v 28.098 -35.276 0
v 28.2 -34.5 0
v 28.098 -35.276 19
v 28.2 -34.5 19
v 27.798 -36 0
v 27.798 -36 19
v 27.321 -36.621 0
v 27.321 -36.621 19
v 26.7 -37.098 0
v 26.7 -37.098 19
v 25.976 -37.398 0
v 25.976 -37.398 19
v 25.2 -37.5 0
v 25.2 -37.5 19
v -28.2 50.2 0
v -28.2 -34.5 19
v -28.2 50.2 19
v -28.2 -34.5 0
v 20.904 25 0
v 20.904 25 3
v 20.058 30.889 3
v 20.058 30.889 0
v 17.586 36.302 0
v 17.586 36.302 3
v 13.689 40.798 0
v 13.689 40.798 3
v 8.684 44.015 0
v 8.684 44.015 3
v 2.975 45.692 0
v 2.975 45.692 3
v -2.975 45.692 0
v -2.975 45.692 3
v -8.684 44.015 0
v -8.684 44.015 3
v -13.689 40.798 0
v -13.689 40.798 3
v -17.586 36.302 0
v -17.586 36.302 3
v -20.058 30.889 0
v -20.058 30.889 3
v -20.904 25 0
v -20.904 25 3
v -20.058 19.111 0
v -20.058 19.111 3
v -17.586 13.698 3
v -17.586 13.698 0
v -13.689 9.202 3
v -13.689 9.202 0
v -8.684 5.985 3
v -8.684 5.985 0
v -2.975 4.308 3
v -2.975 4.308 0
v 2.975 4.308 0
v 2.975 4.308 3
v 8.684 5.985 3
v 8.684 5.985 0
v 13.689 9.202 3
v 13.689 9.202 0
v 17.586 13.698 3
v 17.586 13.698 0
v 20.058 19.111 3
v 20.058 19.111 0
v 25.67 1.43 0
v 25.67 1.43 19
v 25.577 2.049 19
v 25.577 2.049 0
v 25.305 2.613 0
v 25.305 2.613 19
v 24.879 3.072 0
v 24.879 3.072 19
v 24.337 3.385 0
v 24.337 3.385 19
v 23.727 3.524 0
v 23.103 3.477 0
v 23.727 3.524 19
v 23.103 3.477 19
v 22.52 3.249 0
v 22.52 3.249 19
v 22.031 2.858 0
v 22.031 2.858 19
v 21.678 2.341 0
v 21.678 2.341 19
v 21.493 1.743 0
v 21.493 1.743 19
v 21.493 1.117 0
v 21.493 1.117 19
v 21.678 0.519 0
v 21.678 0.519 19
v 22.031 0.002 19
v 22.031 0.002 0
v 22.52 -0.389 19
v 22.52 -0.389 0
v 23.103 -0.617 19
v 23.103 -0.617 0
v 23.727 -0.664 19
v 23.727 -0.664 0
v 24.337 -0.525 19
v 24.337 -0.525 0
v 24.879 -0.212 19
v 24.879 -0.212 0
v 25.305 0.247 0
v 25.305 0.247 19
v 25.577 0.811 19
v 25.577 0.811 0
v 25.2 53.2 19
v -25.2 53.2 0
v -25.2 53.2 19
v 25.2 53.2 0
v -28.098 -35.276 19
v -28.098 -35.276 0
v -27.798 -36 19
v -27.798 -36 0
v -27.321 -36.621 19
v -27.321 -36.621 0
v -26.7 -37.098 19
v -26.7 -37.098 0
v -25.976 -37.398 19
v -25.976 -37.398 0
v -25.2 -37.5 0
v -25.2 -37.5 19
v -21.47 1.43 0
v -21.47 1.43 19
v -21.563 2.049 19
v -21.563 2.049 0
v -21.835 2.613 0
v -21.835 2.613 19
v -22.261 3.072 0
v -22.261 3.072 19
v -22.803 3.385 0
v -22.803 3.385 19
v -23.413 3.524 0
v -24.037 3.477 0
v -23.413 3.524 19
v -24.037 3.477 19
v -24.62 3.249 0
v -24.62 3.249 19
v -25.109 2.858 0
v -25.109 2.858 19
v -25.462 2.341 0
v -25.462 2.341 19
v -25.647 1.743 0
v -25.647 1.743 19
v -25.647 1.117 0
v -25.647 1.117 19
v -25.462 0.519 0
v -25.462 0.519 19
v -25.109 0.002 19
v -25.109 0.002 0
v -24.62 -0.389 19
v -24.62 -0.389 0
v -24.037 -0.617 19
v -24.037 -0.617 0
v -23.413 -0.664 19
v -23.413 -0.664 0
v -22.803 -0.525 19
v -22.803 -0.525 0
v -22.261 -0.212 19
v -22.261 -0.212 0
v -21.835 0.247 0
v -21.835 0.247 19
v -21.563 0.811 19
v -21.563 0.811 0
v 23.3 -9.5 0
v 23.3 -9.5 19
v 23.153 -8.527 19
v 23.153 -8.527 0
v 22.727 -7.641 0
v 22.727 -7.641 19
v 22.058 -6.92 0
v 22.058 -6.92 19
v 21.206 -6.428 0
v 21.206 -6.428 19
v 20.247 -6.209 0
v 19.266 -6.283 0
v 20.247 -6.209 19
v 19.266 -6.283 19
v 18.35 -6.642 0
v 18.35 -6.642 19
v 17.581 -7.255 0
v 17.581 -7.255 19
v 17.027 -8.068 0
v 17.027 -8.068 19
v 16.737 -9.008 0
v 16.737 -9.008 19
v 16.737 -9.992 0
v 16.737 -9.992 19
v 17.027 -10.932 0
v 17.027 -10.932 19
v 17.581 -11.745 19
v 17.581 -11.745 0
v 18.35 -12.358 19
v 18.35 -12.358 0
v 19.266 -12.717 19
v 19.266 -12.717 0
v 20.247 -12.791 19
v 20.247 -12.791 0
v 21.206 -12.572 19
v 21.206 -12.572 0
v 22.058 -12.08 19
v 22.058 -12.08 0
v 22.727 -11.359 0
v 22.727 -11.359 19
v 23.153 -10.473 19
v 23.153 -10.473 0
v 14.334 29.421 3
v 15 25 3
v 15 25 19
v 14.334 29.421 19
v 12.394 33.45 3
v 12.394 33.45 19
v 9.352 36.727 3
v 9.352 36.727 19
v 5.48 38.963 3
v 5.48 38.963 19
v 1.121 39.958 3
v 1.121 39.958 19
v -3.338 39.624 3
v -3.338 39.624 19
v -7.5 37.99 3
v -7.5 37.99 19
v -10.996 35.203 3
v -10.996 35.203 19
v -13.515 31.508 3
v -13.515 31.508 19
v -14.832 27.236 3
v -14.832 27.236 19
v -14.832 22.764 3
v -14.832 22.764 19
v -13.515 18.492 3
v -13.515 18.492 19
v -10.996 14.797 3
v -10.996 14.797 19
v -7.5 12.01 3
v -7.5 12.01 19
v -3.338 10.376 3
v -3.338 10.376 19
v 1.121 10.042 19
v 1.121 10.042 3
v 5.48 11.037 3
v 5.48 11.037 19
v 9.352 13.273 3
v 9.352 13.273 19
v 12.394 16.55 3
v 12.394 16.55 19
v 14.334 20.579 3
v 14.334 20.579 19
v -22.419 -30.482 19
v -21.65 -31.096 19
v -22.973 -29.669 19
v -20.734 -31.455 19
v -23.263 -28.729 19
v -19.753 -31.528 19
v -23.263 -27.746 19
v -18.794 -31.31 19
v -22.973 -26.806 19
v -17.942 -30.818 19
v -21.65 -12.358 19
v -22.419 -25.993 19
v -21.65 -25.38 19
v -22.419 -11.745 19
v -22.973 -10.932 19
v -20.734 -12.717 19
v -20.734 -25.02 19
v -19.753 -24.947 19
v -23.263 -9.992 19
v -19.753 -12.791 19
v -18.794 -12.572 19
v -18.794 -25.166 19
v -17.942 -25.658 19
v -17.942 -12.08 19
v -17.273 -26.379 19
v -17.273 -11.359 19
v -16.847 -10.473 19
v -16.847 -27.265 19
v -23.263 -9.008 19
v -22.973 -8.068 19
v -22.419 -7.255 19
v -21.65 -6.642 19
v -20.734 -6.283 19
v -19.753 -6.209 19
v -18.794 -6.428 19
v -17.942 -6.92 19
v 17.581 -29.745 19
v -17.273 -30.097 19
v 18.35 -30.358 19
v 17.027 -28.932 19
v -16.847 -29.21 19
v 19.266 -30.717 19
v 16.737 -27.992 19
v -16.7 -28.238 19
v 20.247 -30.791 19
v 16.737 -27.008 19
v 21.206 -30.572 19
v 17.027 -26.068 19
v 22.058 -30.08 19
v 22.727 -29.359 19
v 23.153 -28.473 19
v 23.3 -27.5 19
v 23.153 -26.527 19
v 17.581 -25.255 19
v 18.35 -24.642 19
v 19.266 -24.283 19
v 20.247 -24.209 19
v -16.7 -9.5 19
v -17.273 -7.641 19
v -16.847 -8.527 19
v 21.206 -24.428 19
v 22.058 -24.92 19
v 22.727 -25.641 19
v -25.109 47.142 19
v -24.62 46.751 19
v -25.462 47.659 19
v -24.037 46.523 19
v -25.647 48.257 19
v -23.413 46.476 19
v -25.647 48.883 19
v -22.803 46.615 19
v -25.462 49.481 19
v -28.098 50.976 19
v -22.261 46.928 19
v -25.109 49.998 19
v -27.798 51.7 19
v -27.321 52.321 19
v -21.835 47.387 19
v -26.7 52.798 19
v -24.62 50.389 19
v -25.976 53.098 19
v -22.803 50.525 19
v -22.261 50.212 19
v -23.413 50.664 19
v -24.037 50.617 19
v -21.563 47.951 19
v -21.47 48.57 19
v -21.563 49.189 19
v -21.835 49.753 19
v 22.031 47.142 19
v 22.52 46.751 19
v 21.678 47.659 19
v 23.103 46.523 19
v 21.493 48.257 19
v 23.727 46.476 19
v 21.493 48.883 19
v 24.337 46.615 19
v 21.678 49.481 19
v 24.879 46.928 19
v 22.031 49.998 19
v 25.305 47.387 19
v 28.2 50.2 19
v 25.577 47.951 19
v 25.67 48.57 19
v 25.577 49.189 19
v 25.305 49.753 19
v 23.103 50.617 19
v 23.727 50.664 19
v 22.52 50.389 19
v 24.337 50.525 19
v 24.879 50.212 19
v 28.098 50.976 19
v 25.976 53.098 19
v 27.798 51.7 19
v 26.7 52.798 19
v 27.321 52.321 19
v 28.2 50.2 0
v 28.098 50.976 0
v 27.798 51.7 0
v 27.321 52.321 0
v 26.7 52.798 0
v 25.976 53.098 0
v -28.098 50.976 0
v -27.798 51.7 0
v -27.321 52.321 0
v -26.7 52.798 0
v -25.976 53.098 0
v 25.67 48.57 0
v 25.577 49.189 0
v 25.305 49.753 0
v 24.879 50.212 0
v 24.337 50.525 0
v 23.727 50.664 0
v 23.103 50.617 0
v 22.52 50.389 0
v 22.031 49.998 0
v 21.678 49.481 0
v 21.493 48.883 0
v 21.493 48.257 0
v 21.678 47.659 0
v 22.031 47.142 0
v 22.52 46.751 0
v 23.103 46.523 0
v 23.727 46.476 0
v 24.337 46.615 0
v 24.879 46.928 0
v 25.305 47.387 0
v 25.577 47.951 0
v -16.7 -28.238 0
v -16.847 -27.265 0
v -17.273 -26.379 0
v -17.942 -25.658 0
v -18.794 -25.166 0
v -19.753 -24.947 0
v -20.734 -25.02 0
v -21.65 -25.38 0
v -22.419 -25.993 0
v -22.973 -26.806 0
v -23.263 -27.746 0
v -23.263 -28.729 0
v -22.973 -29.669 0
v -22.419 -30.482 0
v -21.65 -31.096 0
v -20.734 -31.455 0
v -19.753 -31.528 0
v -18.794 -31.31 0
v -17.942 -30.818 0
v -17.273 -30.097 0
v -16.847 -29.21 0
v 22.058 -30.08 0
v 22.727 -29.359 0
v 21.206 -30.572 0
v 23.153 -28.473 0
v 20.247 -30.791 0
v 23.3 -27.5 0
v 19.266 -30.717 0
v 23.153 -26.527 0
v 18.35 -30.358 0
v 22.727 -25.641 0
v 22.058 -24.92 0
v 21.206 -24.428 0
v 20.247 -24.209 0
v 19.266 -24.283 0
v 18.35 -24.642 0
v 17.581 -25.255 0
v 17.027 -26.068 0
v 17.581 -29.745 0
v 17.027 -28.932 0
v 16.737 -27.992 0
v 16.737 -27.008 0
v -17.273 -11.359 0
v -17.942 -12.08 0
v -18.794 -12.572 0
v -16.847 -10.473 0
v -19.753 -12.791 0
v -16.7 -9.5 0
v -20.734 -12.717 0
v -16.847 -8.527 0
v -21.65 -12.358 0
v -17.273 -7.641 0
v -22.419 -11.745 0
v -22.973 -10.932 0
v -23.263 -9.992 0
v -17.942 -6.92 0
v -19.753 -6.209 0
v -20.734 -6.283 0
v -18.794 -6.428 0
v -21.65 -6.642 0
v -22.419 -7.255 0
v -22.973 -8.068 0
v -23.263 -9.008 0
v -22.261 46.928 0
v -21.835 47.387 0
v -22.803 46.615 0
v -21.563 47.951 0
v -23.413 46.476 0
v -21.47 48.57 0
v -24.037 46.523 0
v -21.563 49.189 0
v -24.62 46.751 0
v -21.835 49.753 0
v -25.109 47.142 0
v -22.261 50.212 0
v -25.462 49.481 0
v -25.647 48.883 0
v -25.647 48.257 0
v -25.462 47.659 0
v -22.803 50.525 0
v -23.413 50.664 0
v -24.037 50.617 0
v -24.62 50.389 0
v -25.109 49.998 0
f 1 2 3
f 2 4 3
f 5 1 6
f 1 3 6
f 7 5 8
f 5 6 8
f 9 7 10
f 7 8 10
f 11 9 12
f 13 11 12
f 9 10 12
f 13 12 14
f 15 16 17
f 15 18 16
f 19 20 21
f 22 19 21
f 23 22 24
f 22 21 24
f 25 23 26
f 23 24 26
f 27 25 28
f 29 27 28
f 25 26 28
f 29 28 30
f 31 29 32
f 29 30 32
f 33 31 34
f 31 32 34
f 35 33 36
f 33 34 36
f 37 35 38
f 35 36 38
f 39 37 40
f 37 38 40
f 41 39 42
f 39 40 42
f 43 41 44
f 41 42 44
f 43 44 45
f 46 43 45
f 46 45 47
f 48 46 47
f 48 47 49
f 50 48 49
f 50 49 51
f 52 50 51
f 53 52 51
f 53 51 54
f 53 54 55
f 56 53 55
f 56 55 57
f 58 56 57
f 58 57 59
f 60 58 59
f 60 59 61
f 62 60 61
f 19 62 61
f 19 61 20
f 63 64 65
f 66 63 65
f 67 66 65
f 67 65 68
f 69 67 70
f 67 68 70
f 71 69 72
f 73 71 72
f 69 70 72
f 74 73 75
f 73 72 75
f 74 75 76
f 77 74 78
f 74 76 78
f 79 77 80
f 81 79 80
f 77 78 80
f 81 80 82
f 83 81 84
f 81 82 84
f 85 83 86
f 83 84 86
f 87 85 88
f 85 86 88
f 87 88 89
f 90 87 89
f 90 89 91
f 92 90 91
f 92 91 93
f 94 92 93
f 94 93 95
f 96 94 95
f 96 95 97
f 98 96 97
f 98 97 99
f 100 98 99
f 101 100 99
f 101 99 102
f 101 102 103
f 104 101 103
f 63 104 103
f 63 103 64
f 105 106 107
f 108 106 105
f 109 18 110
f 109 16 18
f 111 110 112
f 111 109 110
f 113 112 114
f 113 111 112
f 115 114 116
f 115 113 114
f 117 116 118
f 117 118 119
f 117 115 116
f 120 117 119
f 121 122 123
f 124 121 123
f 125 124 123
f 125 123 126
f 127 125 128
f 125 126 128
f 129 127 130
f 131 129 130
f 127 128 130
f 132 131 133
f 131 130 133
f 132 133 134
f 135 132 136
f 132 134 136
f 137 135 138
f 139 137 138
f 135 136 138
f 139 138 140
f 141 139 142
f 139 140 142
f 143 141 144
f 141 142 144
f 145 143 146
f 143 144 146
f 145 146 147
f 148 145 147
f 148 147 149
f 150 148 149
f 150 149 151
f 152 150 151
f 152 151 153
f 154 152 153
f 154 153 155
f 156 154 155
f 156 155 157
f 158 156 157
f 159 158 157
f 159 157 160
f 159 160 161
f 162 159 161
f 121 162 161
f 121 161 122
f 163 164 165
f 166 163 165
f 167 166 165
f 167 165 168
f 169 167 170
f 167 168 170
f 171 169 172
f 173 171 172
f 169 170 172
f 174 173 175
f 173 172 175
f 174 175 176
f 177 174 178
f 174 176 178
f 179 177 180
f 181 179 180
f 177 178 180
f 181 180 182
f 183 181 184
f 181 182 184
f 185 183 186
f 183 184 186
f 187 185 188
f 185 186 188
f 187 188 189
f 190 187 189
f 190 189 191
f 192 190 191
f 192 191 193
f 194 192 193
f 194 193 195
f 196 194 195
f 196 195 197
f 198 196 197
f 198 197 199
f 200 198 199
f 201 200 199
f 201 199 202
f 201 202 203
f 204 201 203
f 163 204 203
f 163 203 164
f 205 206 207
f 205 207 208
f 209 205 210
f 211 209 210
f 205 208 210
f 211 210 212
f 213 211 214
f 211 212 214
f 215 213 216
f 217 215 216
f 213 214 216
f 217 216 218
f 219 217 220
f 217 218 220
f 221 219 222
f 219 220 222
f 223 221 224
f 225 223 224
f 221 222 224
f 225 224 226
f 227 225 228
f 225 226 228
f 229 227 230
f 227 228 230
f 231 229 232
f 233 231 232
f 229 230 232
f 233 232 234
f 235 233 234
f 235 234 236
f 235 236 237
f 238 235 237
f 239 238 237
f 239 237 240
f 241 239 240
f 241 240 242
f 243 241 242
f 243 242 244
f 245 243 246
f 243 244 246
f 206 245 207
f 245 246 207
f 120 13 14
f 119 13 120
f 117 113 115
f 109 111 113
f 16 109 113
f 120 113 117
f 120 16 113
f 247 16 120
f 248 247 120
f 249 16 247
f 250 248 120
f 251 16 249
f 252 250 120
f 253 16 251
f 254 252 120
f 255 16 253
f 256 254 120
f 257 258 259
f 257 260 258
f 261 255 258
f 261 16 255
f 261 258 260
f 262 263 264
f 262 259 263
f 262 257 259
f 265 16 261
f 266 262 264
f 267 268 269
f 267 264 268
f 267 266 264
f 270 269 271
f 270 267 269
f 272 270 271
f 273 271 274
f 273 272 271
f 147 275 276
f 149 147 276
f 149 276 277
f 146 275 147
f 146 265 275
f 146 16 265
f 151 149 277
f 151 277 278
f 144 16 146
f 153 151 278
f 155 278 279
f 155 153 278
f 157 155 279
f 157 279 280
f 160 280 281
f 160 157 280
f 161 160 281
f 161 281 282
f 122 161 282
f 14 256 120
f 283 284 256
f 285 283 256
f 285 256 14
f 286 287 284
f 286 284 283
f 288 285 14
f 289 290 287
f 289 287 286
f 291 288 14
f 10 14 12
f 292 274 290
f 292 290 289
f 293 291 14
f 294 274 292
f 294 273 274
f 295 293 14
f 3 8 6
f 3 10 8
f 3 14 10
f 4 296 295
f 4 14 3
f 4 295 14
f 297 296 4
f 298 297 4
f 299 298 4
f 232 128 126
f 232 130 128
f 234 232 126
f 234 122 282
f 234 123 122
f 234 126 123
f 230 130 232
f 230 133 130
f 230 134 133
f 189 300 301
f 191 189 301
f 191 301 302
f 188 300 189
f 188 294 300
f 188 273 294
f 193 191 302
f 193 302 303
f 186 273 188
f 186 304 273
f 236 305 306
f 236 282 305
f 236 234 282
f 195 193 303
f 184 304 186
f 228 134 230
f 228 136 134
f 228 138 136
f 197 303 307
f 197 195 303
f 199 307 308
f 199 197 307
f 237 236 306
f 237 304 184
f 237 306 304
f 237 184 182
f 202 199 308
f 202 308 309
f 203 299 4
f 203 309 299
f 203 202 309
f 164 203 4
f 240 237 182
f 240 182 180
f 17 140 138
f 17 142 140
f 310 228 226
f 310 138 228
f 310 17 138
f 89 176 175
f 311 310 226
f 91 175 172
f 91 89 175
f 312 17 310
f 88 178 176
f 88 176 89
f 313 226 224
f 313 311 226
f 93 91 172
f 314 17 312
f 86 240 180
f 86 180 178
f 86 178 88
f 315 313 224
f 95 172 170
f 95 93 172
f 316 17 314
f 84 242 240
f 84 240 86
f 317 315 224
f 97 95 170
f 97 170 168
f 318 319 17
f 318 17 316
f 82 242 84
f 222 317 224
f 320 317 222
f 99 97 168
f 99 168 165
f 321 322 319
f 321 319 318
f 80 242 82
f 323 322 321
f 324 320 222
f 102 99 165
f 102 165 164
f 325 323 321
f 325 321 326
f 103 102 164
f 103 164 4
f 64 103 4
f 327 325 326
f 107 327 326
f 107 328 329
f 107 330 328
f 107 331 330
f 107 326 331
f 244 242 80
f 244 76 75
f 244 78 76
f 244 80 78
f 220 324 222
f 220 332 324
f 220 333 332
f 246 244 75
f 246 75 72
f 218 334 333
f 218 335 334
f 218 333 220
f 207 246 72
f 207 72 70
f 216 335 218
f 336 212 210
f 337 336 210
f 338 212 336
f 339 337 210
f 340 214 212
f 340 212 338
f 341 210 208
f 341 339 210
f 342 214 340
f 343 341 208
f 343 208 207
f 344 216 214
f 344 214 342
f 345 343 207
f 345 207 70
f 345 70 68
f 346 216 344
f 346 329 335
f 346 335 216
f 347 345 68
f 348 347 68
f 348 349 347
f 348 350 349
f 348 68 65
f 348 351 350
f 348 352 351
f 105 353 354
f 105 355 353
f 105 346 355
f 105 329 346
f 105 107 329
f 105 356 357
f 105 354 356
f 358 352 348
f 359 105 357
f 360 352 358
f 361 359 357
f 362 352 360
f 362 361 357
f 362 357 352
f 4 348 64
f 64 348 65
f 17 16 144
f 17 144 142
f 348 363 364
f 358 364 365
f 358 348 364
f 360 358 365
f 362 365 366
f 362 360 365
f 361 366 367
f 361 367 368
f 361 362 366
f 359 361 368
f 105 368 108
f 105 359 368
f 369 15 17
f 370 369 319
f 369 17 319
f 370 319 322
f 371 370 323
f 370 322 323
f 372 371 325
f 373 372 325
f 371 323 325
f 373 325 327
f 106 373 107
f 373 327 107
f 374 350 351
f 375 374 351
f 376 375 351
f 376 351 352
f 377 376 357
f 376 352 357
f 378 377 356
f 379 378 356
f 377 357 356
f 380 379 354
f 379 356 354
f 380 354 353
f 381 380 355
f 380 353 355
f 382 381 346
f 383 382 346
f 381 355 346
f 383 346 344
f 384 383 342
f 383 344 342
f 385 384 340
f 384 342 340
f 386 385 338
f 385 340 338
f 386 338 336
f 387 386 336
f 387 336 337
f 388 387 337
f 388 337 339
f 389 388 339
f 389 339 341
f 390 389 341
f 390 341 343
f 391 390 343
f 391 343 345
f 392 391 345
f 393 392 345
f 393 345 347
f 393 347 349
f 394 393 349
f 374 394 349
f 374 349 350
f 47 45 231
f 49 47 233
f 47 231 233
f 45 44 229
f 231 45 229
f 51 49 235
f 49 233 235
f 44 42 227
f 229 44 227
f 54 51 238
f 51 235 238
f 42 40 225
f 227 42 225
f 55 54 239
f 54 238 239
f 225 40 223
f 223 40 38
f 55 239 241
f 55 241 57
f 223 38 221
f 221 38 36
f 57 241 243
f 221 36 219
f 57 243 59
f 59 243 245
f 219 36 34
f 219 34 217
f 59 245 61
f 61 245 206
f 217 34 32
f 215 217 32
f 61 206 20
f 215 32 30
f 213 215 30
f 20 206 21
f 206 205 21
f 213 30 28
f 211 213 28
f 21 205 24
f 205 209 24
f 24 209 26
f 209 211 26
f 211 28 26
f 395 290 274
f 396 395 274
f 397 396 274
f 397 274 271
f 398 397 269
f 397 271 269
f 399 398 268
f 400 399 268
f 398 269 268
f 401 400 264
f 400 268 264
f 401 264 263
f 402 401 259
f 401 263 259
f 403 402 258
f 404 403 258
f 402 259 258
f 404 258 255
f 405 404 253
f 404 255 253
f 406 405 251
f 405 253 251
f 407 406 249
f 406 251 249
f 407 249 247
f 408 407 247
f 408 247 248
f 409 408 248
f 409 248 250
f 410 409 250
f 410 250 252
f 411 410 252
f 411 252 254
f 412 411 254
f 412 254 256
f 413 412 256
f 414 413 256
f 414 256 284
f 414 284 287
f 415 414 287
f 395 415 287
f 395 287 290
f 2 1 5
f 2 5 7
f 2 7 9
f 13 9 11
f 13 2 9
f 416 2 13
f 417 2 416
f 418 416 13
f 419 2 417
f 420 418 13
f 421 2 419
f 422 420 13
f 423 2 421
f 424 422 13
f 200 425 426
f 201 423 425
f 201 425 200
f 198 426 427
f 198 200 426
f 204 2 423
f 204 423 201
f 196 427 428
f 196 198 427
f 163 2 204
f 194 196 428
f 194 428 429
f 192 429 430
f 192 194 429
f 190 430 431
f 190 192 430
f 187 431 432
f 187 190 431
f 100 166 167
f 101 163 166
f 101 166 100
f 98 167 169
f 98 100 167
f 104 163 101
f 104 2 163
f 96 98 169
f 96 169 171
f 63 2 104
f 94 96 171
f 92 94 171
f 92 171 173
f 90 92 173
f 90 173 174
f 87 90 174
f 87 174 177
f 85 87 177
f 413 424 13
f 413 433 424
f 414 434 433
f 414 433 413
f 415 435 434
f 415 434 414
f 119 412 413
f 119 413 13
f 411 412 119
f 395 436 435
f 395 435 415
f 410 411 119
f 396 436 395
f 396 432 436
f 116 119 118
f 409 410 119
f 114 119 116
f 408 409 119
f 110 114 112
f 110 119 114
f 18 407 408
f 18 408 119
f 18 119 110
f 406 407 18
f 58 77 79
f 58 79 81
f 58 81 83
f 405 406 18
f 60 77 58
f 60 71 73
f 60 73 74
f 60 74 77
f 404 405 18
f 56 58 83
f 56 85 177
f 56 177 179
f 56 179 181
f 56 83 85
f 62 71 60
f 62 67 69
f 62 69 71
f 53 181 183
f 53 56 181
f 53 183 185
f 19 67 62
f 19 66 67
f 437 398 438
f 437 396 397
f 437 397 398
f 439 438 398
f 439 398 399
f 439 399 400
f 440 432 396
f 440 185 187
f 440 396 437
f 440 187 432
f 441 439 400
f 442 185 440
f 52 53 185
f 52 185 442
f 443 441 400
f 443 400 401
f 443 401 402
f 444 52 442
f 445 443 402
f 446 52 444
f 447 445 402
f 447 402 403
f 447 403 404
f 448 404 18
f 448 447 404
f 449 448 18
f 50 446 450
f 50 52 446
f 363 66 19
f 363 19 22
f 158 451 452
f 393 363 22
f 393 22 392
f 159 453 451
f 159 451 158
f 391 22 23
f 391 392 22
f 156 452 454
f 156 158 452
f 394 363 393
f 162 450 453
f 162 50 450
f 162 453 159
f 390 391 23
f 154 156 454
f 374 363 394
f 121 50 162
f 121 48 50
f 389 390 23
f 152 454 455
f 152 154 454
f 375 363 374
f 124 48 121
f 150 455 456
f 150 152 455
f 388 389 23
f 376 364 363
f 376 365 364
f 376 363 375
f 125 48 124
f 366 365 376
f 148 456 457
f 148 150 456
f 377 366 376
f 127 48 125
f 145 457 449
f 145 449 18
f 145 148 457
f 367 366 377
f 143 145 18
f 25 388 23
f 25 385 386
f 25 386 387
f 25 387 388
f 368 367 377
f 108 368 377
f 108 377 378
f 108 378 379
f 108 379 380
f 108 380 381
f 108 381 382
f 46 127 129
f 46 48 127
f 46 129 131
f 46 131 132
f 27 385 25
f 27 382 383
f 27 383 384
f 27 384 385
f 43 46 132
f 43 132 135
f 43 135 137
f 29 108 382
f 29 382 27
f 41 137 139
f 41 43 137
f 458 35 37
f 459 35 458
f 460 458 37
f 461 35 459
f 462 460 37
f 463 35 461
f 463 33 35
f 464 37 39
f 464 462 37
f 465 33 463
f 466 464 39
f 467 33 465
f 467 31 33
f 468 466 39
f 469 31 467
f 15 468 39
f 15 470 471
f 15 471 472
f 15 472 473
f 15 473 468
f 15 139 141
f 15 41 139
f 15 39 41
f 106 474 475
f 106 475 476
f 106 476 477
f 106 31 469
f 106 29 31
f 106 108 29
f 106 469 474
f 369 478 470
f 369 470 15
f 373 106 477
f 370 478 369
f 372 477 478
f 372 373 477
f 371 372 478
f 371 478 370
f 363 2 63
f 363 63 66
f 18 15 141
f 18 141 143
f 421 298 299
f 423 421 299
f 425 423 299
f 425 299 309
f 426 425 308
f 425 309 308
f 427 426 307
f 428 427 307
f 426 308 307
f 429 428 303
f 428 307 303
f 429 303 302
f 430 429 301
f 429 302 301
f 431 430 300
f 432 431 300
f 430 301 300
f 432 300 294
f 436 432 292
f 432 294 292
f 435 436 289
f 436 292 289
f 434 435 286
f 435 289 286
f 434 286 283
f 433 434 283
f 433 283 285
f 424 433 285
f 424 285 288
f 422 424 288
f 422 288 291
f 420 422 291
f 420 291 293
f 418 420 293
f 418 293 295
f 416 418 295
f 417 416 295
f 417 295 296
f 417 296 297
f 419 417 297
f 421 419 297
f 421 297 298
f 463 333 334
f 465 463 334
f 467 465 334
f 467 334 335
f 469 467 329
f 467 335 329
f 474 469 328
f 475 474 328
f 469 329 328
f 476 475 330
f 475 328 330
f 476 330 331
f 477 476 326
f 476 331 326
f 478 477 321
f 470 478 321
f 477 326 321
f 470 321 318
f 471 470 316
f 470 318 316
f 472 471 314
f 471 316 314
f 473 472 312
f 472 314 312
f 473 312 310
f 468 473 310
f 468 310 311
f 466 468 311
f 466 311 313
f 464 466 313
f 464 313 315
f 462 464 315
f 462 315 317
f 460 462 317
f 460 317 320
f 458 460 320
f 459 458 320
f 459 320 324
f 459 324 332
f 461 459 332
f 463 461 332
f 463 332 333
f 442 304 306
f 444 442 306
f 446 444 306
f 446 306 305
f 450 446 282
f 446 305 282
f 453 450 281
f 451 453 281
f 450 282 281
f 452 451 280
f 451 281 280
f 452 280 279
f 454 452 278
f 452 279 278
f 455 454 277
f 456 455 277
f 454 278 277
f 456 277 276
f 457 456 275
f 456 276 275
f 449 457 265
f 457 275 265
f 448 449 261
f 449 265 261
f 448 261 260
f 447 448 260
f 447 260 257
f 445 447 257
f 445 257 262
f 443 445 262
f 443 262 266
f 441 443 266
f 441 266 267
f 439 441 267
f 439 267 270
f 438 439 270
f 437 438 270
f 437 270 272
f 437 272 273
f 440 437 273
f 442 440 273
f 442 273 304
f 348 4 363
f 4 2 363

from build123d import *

# Parameters (mm, degrees)
SKETCH1_W               = 56.4
SKETCH1_H               = 56.4
BOSS_EXTRUDE1_DEPTH     = 19
SKETCH2_R               = 20.904355549
CUT_EXTRUDE2_DEPTH      = 20
SKETCH3_W               = 56.4
SKETCH3_H               = 34.3
BOSS_EXTRUDE2_DEPTH     = 19
FILLET1_R               = 3
TAP_DRILL_FOR_M5_TAP1_D = 4.2
M6_CLEARANCE_HOLE1_D    = 6.6
SKETCH8_R               = 20.904355549
SKETCH8_R_2             = 15
BOSS_EXTRUDE3_DEPTH     = 16


with BuildPart() as part:
    # Sketch1 → Boss-Extrude1 (new body)
    with BuildSketch(Plane.XY):
        with Locations((0, 25)):
            Rectangle(SKETCH1_W, SKETCH1_H)
    extrude(amount=BOSS_EXTRUDE1_DEPTH)

    # Sketch2 → Cut-Extrude2 (cut)
    with BuildSketch(Plane.XY.offset(19)):
        with Locations((0, 25)):
            Circle(SKETCH2_R)
    extrude(amount=-CUT_EXTRUDE2_DEPTH, mode=Mode.SUBTRACT)

    # Sketch3 → Boss-Extrude2 (add)
    with BuildSketch(Plane(origin=(0, 0, 0), x_dir=(-1, 0, 0), z_dir=(0, 0, -1))):
        with Locations((0, -20.35)):
            Rectangle(SKETCH3_W, SKETCH3_H)
    extrude(amount=-BOSS_EXTRUDE2_DEPTH)

    # Fillet1
    fillet1_edges = [part.edges().sort_by_distance(p)[0] for p in [
        (28.2, -37.5, 9.5),
        (-28.2, -37.5, 9.5),
        (28.2, 53.2, 9.5),
        (-28.2, 53.2, 9.5),
    ]]
    fillet(fillet1_edges, radius=FILLET1_R)

    # Tap Drill for M5 Tap1 (through all)
    with Locations(Plane(origin=(0, 0, 0), x_dir=(-1, 0, 0), z_dir=(0, 0, -1))):
        with Locations((-23.57, 48.57), (23.57, 48.57), (-23.57, 1.43), (23.57, 1.43)):
            Hole(TAP_DRILL_FOR_M5_TAP1_D / 2)

    # M6 Clearance Hole1 (through all)
    with Locations(Plane(origin=(0, 0, 0), x_dir=(-1, 0, 0), z_dir=(0, 0, -1))):
        with Locations((-20, -9.5), (-20, -27.5), (20, -28.237657735), (20, -9.5)):
            Hole(M6_CLEARANCE_HOLE1_D / 2)

    # Sketch8 → Boss-Extrude3 (add)
    with BuildSketch(Plane.XY.offset(19)):
        with Locations((0, 25)):
            Circle(SKETCH8_R)
        with Locations((0, 25)):
            Circle(SKETCH8_R_2, mode=Mode.SUBTRACT)
    extrude(amount=-BOSS_EXTRUDE3_DEPTH)


solid = part.part
